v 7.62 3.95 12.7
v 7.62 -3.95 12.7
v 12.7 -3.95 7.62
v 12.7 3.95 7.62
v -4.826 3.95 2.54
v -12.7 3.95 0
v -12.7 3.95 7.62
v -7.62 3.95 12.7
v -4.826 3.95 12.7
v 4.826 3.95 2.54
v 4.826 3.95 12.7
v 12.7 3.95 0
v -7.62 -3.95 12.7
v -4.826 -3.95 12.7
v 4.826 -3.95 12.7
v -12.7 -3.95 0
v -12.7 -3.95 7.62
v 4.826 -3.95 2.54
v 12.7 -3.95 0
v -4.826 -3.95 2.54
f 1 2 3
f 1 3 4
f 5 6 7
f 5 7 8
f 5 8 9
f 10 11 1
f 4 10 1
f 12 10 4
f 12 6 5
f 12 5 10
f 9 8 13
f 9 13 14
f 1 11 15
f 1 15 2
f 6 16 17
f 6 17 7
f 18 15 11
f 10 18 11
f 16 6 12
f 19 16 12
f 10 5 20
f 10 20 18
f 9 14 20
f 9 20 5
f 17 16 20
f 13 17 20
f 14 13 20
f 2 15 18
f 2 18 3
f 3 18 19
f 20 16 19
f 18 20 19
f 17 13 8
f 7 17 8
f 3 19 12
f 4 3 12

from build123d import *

# Parameters (mm, degrees)
F0_W     = 25.4
F0_H     = 7.9
F1_DEPTH = 12.7
F2_SIZE  = 5.08
F3_W     = 9.652
F3_H     = 7.9
F4_DEPTH = 10.16


with BuildPart() as f1:
    # F0 (on Top) → F1 (new body)
    with BuildSketch(Plane.XY):
        Rectangle(F0_W, F0_H)
    extrude(amount=F1_DEPTH)

    # F2
    f2_edges = [f1.edges().sort_by_distance(p)[0] for p in [
        (12.7, 0, 12.7),
        (-12.7, 0, 12.7),
    ]]
    chamfer(f2_edges, length=F2_SIZE)

    # F3 (on face) → F4 (cut)
    with BuildSketch(Plane.XY.offset(12.7)):
        Rectangle(F3_W, F3_H)
    extrude(amount=-F4_DEPTH, mode=Mode.SUBTRACT)


solid = f1.part
